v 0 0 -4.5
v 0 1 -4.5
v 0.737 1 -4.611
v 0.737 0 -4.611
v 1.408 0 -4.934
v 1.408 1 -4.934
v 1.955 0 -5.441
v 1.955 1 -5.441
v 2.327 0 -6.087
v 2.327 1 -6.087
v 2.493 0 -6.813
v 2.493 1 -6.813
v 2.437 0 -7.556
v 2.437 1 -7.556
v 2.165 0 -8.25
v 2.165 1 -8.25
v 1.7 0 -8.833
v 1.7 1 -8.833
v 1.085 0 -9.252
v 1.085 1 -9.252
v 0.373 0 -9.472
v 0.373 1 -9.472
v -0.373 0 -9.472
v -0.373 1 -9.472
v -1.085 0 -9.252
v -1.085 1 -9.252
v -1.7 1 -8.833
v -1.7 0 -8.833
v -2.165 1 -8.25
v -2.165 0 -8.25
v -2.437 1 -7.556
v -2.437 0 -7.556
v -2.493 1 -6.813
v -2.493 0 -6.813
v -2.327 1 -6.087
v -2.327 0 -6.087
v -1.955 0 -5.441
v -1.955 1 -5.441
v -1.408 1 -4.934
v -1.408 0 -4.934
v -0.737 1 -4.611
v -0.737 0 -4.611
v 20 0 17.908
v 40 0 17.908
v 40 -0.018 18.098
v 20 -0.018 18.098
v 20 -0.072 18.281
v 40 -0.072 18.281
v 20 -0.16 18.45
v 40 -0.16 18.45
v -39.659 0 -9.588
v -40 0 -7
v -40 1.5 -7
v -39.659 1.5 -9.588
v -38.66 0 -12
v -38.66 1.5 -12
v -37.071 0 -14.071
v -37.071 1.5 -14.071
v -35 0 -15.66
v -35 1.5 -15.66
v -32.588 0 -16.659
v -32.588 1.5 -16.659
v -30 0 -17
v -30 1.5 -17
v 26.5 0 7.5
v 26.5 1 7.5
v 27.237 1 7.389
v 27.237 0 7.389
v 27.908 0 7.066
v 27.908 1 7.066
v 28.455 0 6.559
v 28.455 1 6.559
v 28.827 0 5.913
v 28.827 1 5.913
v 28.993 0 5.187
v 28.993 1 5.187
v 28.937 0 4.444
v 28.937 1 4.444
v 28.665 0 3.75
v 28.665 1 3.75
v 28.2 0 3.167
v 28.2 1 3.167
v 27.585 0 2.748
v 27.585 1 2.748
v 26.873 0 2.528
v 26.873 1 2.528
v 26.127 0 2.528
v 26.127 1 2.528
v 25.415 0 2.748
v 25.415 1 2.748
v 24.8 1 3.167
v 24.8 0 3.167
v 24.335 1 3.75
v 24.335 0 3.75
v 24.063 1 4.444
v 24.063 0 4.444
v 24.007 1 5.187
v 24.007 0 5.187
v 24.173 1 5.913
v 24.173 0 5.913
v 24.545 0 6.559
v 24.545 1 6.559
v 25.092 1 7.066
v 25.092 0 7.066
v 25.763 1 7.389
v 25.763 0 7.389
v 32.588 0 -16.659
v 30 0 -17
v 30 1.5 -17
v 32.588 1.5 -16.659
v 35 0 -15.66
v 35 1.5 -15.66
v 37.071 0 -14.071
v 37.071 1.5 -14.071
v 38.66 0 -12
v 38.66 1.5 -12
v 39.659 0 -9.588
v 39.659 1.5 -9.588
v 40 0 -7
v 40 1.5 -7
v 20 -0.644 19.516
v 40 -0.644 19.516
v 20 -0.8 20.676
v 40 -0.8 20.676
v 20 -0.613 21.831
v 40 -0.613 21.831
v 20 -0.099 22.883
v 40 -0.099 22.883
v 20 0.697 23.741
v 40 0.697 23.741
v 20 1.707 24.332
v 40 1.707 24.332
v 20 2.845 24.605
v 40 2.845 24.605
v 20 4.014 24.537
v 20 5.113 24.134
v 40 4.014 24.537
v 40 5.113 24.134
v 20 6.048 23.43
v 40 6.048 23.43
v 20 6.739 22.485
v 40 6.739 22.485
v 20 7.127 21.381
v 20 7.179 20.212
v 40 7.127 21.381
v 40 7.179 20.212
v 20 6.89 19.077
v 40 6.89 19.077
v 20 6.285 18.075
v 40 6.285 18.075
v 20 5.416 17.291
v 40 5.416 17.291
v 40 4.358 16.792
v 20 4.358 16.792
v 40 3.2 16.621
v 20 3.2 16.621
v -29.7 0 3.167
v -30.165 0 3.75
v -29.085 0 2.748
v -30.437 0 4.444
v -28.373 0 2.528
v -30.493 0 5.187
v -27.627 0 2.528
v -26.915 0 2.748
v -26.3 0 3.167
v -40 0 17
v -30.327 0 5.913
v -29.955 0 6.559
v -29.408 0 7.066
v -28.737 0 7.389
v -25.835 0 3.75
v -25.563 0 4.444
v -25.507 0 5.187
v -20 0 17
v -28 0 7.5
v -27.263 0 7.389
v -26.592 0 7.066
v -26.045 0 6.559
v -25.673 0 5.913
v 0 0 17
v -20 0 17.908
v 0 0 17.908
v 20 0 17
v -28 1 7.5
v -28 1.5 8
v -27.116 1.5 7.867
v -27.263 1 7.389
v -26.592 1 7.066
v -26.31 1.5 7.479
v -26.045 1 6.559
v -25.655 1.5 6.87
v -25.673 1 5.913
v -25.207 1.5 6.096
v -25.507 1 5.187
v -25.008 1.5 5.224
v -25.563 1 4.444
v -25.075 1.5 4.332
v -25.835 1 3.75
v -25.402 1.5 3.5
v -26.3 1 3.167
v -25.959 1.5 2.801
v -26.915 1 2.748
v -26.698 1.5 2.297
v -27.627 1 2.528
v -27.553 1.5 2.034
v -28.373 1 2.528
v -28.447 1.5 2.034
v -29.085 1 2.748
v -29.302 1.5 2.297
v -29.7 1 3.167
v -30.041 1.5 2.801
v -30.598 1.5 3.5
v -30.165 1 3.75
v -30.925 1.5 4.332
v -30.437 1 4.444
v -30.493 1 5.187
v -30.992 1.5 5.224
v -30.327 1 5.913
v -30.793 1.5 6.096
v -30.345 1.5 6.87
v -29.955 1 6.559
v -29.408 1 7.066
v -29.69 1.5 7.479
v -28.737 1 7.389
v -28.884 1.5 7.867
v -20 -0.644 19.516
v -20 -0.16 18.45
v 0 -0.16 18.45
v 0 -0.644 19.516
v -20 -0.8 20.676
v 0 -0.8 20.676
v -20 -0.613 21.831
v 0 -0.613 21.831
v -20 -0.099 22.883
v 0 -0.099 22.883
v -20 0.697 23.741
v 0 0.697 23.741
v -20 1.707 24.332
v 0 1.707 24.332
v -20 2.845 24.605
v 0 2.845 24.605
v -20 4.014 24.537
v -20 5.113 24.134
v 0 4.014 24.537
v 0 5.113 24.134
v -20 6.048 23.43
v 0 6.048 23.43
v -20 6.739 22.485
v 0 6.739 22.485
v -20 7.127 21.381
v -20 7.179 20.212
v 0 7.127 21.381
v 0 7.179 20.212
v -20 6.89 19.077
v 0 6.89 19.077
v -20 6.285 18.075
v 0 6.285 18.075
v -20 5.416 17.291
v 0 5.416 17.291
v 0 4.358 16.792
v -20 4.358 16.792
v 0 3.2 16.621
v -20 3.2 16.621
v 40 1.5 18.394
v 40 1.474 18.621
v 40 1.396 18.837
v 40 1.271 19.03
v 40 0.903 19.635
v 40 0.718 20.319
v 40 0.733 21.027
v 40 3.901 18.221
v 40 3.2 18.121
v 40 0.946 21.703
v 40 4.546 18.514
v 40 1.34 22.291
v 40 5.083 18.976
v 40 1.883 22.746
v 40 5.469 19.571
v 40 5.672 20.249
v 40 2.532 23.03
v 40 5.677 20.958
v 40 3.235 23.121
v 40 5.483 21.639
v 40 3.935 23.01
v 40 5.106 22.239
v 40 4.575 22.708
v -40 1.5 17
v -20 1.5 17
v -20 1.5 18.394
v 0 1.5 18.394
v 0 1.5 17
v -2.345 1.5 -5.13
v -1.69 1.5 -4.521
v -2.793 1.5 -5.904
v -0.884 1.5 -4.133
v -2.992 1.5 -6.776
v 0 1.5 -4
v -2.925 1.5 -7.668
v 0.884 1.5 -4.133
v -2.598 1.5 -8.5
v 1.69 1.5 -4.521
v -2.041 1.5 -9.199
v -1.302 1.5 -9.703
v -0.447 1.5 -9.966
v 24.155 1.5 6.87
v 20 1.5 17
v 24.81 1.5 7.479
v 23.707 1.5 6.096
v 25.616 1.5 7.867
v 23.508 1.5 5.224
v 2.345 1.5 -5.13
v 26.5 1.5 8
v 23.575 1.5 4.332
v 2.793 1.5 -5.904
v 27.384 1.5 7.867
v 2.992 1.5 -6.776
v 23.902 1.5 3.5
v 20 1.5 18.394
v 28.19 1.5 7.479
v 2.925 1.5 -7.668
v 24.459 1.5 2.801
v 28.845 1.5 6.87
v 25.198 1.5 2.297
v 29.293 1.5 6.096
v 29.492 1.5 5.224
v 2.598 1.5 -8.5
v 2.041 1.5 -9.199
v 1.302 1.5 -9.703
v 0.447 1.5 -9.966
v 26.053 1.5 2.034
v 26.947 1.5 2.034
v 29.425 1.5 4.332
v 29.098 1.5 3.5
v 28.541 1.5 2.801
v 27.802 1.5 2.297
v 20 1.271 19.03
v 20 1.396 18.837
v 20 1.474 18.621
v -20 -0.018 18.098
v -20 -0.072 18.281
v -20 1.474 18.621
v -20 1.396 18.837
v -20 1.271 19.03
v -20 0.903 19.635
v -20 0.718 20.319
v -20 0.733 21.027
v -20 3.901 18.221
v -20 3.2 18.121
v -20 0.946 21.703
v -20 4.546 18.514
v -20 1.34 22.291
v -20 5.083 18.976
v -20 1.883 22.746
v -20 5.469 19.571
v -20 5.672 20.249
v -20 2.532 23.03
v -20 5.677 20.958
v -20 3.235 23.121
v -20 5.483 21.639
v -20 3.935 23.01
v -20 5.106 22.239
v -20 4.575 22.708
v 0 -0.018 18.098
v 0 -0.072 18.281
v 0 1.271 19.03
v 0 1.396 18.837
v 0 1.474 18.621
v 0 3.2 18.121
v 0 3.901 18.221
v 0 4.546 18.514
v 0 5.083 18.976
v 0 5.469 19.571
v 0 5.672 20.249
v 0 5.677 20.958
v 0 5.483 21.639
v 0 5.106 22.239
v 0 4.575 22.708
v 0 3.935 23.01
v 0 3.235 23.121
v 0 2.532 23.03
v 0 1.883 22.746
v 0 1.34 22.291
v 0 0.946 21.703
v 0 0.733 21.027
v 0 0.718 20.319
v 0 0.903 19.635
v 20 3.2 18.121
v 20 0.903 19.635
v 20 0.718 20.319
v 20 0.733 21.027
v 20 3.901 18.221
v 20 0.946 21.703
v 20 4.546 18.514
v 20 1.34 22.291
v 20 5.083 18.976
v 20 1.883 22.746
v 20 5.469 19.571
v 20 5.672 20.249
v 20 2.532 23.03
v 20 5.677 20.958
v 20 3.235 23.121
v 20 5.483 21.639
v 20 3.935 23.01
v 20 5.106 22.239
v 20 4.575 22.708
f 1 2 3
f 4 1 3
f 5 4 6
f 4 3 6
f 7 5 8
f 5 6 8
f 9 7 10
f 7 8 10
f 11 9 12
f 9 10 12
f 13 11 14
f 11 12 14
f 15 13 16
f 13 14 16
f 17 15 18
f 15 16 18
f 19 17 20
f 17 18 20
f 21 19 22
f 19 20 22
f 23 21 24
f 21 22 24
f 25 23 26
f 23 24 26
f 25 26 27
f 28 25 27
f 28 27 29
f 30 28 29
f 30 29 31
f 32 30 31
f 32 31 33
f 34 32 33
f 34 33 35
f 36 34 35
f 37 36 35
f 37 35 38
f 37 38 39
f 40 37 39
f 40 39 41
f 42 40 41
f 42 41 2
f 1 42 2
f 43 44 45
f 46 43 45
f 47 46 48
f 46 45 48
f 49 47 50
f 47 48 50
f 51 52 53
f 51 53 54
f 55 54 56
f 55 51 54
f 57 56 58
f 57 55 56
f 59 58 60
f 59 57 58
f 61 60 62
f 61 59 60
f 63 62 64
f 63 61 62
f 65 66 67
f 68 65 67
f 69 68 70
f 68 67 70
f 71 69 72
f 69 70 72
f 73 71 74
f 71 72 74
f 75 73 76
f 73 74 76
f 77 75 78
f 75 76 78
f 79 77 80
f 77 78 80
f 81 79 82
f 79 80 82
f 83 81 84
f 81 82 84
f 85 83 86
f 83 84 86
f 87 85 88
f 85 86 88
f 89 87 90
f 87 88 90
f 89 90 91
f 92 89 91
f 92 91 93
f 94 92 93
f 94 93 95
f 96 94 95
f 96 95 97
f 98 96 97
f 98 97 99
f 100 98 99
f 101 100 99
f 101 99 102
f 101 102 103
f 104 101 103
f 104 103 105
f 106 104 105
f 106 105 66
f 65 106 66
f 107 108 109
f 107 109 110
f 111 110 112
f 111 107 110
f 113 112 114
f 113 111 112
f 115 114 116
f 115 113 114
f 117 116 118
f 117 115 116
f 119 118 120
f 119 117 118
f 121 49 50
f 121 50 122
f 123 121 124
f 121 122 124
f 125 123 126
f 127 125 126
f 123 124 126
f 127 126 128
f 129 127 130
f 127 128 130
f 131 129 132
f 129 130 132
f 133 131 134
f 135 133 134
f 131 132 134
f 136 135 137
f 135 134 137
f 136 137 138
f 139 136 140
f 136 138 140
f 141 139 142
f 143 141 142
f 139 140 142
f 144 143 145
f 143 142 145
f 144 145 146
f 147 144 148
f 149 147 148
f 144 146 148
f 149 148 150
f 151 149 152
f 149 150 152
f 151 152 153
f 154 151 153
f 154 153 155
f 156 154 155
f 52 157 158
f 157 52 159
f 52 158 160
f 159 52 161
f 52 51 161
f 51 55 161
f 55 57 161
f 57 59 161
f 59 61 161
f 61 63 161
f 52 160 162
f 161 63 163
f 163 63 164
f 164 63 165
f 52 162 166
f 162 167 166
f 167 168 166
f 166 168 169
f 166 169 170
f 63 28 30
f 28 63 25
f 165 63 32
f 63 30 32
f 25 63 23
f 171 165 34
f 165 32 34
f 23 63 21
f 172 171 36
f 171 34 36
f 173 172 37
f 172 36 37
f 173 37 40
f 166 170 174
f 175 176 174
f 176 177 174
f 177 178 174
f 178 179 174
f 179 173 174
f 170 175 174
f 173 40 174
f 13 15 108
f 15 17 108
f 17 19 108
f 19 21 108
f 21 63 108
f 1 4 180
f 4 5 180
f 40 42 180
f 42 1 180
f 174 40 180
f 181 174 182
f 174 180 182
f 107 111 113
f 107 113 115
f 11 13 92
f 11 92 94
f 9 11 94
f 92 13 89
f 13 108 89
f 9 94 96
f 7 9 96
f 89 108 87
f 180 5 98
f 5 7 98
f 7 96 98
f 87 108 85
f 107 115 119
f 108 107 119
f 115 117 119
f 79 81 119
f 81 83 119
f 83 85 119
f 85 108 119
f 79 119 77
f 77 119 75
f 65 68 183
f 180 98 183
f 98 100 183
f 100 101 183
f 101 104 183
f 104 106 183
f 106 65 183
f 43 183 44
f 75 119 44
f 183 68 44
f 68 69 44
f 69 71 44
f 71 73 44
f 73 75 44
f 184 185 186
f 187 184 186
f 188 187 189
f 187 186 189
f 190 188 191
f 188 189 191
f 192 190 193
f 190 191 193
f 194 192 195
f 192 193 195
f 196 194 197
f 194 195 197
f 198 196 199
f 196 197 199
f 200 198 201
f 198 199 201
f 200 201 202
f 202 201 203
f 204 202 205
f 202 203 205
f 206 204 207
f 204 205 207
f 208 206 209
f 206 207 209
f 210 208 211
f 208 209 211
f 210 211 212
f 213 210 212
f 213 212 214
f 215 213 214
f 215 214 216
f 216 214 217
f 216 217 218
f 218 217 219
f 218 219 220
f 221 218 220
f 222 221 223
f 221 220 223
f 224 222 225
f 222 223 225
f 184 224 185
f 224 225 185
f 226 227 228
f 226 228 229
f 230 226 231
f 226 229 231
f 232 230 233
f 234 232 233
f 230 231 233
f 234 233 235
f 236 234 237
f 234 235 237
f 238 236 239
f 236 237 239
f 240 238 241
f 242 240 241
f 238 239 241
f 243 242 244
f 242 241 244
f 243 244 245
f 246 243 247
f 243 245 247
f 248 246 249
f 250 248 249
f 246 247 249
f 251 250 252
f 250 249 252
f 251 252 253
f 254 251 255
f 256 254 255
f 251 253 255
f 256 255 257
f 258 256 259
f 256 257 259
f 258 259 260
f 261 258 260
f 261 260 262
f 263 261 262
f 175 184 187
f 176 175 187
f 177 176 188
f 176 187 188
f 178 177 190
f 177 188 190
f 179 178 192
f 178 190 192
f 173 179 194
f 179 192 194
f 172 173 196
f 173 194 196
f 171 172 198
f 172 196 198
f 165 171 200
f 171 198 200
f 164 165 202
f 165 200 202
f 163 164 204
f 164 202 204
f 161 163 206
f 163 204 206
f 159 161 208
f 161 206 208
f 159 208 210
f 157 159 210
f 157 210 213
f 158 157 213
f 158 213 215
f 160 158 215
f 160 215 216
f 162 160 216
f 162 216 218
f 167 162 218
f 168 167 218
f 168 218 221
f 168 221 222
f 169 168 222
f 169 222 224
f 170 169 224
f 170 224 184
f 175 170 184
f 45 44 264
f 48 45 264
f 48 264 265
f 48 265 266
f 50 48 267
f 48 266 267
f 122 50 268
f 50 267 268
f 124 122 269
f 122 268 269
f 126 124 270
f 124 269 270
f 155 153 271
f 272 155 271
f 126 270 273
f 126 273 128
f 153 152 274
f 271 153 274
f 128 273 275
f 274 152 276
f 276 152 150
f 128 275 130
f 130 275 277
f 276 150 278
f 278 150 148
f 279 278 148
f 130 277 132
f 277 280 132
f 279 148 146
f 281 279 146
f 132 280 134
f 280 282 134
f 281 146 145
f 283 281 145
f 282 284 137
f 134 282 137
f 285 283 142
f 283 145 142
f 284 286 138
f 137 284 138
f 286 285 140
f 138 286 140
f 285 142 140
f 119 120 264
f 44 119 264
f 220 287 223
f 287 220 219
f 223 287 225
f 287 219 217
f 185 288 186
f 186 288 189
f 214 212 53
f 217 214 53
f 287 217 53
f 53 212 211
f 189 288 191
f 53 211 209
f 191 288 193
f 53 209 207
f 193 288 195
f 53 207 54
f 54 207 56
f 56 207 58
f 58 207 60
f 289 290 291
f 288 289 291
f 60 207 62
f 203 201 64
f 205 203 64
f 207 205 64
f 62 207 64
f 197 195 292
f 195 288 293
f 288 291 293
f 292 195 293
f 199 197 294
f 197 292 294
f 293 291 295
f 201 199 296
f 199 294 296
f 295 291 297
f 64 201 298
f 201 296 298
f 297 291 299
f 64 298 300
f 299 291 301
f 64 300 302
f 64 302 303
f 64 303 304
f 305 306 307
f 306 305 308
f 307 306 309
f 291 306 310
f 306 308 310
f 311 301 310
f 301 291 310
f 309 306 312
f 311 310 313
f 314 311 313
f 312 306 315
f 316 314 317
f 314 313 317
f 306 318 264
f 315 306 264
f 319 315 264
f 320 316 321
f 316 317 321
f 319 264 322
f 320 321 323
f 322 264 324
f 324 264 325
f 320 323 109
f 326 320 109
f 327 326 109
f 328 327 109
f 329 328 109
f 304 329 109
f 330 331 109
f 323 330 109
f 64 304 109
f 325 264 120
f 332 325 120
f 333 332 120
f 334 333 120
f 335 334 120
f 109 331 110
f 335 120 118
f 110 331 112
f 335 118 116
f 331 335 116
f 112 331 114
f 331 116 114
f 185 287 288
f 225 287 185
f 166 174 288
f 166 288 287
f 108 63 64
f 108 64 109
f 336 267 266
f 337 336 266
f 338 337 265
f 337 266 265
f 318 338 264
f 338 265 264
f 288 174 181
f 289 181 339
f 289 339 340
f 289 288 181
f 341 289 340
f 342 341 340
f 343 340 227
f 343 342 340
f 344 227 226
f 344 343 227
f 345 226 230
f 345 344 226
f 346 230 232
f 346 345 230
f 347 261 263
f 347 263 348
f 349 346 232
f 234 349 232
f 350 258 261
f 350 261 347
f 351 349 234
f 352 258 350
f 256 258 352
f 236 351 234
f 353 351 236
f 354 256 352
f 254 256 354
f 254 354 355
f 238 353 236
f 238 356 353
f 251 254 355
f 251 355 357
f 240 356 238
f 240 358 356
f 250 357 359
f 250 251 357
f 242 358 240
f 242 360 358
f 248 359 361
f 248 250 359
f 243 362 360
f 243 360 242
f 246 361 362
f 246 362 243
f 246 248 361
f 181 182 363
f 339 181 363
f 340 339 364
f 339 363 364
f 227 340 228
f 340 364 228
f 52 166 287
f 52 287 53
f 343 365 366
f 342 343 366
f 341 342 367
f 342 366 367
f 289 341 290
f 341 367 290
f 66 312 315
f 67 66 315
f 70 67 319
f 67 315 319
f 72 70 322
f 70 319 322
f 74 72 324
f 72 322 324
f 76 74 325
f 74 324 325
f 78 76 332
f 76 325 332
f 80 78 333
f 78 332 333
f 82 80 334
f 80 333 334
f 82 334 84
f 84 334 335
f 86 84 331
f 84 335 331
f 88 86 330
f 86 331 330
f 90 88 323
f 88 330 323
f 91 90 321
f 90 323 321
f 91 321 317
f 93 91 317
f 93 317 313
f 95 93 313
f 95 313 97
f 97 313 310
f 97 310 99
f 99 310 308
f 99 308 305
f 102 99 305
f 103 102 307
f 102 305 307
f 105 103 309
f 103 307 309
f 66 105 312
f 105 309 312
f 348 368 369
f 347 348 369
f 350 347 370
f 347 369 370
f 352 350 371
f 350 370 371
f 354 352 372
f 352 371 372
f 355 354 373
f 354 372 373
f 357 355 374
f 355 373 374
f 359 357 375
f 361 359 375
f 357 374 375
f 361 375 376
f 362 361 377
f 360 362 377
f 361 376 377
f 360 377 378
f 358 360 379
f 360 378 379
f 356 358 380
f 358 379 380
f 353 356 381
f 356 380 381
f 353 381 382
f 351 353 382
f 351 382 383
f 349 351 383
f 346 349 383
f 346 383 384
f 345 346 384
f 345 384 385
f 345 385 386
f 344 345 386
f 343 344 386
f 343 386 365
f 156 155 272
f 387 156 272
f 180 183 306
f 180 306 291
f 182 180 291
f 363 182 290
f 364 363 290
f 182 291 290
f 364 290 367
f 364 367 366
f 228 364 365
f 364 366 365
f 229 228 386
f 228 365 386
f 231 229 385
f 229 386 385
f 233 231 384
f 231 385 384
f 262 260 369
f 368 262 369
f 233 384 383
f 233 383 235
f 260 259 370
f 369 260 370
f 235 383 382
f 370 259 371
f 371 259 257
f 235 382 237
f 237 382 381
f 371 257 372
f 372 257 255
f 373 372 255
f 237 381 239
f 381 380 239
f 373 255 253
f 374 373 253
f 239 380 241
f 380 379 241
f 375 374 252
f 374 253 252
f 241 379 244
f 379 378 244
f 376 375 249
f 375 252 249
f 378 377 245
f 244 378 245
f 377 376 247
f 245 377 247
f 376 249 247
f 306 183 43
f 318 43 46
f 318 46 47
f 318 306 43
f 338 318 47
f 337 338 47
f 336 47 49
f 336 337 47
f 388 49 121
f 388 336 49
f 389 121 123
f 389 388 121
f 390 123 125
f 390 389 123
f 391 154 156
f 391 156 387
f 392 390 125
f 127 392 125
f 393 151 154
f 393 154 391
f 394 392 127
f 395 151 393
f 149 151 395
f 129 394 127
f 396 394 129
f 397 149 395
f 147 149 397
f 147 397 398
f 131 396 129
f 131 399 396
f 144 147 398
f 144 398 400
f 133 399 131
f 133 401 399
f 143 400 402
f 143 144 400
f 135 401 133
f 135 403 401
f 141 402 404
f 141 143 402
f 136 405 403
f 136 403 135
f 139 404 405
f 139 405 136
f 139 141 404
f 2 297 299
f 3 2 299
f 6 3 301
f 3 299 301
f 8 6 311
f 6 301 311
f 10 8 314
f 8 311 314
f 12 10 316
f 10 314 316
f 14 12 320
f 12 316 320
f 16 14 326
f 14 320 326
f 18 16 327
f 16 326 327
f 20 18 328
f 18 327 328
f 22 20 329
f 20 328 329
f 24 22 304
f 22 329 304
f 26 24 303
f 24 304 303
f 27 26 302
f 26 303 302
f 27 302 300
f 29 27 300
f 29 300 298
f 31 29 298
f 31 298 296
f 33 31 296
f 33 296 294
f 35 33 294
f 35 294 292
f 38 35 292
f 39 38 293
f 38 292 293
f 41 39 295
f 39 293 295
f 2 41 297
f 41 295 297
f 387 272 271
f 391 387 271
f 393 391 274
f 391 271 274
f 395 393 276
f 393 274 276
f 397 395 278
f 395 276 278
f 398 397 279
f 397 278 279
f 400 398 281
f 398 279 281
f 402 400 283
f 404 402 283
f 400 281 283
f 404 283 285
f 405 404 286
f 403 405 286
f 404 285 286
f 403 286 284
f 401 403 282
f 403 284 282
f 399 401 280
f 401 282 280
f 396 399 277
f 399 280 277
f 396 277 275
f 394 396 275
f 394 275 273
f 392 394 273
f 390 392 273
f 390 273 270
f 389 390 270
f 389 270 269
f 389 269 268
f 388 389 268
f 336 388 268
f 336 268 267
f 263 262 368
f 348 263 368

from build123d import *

# Parameters (mm, degrees)
BOSS_EXTRUDE1_DEPTH = 1.5
BOSS_EXTRUDE2_DEPTH = 20
LPATTERN1_COUNT     = 2
LPATTERN1_PITCH     = 40
SKETCH6_R           = 2.5
CUT_EXTRUDE1_DEPTH  = 20
CHAMFER2_SIZE       = 0.5


with BuildPart() as part:
    # Sketch1 → Boss-Extrude1 (new body)
    with BuildSketch(Plane(origin=(0, 0, 0), x_dir=(1, 0, 0), z_dir=(0, 1, 0))):
        with BuildLine():
            Line((-30, 17), (30, 17))
            ThreePointArc((30, 17), (37.071067812, 14.071067812), (40, 7))
            Line((40, 7), (40, -17))
            Line((40, -17), (-40, -17))
            Line((-40, -17), (-40, 7))
            ThreePointArc((-40, 7), (-37.071067812, 14.071067812), (-30, 17))
        make_face()
    extrude(amount=BOSS_EXTRUDE1_DEPTH)

    # Sketch3 → Boss-Extrude2 (add)
    with BuildSketch(Plane(origin=(40, 0, 0), x_dir=(0, 0, -1), z_dir=(1, 0, 0))):
        with BuildLine():
            Line((-17, 0), (-17.907653586, 0))
            ThreePointArc((-17.907653586, 0), (-18.19052708, -0.040842773), (-18.450293899, -0.160034828))
            ThreePointArc((-18.450293899, -0.160034828), (-24.133848537, 5.112645111), (-16.620855154, 3.199825859))
            Line((-16.620855154, 3.199825859), (-18.120855154, 3.199825859))
            ThreePointArc((-18.120855154, 3.199825859), (-22.882198948, 4.265810965), (-19.02991455, 1.271378817))
            ThreePointArc((-19.02991455, 1.271378817), (-18.731636803, 1.441110731), (-18.393538309, 1.5))
            Line((-18.393538309, 1.5), (-17, 1.5))
            Line((-17, 1.5), (-17, 0))
        make_face()
    boss_extrude2 = extrude(amount=-BOSS_EXTRUDE2_DEPTH)

    # LPattern1: Boss-Extrude2 ×2
    with Locations(*[(-i * LPATTERN1_PITCH, 0, 0) for i in range(1, LPATTERN1_COUNT)]):
        add(boss_extrude2)

    # Sketch6 → Cut-Extrude1 (cut)
    with BuildSketch(Plane(origin=(0, 1.5, 0), x_dir=(1, 0, 0), z_dir=(0, 1, 0))):
        with Locations(Location((-28, -5, 0), (0, 0, 270))):
            Circle(SKETCH6_R)
        with Locations(Location((0, 7, 0), (0, 0, 270))):
            Circle(SKETCH6_R)
        with Locations(Location((26.5, -5, 0), (0, 0, 270))):
            Circle(SKETCH6_R)
    extrude(amount=-CUT_EXTRUDE1_DEPTH, mode=Mode.SUBTRACT)

    # Chamfer2
    chamfer2_edges = [part.edges().sort_by_distance(p)[0] for p in [
        (-28, 1.5, 2.5),
        (0, 1.5, -9.5),
        (26.5, 1.5, 2.5),
    ]]
    chamfer(chamfer2_edges, length=CHAMFER2_SIZE)


solid = part.part
